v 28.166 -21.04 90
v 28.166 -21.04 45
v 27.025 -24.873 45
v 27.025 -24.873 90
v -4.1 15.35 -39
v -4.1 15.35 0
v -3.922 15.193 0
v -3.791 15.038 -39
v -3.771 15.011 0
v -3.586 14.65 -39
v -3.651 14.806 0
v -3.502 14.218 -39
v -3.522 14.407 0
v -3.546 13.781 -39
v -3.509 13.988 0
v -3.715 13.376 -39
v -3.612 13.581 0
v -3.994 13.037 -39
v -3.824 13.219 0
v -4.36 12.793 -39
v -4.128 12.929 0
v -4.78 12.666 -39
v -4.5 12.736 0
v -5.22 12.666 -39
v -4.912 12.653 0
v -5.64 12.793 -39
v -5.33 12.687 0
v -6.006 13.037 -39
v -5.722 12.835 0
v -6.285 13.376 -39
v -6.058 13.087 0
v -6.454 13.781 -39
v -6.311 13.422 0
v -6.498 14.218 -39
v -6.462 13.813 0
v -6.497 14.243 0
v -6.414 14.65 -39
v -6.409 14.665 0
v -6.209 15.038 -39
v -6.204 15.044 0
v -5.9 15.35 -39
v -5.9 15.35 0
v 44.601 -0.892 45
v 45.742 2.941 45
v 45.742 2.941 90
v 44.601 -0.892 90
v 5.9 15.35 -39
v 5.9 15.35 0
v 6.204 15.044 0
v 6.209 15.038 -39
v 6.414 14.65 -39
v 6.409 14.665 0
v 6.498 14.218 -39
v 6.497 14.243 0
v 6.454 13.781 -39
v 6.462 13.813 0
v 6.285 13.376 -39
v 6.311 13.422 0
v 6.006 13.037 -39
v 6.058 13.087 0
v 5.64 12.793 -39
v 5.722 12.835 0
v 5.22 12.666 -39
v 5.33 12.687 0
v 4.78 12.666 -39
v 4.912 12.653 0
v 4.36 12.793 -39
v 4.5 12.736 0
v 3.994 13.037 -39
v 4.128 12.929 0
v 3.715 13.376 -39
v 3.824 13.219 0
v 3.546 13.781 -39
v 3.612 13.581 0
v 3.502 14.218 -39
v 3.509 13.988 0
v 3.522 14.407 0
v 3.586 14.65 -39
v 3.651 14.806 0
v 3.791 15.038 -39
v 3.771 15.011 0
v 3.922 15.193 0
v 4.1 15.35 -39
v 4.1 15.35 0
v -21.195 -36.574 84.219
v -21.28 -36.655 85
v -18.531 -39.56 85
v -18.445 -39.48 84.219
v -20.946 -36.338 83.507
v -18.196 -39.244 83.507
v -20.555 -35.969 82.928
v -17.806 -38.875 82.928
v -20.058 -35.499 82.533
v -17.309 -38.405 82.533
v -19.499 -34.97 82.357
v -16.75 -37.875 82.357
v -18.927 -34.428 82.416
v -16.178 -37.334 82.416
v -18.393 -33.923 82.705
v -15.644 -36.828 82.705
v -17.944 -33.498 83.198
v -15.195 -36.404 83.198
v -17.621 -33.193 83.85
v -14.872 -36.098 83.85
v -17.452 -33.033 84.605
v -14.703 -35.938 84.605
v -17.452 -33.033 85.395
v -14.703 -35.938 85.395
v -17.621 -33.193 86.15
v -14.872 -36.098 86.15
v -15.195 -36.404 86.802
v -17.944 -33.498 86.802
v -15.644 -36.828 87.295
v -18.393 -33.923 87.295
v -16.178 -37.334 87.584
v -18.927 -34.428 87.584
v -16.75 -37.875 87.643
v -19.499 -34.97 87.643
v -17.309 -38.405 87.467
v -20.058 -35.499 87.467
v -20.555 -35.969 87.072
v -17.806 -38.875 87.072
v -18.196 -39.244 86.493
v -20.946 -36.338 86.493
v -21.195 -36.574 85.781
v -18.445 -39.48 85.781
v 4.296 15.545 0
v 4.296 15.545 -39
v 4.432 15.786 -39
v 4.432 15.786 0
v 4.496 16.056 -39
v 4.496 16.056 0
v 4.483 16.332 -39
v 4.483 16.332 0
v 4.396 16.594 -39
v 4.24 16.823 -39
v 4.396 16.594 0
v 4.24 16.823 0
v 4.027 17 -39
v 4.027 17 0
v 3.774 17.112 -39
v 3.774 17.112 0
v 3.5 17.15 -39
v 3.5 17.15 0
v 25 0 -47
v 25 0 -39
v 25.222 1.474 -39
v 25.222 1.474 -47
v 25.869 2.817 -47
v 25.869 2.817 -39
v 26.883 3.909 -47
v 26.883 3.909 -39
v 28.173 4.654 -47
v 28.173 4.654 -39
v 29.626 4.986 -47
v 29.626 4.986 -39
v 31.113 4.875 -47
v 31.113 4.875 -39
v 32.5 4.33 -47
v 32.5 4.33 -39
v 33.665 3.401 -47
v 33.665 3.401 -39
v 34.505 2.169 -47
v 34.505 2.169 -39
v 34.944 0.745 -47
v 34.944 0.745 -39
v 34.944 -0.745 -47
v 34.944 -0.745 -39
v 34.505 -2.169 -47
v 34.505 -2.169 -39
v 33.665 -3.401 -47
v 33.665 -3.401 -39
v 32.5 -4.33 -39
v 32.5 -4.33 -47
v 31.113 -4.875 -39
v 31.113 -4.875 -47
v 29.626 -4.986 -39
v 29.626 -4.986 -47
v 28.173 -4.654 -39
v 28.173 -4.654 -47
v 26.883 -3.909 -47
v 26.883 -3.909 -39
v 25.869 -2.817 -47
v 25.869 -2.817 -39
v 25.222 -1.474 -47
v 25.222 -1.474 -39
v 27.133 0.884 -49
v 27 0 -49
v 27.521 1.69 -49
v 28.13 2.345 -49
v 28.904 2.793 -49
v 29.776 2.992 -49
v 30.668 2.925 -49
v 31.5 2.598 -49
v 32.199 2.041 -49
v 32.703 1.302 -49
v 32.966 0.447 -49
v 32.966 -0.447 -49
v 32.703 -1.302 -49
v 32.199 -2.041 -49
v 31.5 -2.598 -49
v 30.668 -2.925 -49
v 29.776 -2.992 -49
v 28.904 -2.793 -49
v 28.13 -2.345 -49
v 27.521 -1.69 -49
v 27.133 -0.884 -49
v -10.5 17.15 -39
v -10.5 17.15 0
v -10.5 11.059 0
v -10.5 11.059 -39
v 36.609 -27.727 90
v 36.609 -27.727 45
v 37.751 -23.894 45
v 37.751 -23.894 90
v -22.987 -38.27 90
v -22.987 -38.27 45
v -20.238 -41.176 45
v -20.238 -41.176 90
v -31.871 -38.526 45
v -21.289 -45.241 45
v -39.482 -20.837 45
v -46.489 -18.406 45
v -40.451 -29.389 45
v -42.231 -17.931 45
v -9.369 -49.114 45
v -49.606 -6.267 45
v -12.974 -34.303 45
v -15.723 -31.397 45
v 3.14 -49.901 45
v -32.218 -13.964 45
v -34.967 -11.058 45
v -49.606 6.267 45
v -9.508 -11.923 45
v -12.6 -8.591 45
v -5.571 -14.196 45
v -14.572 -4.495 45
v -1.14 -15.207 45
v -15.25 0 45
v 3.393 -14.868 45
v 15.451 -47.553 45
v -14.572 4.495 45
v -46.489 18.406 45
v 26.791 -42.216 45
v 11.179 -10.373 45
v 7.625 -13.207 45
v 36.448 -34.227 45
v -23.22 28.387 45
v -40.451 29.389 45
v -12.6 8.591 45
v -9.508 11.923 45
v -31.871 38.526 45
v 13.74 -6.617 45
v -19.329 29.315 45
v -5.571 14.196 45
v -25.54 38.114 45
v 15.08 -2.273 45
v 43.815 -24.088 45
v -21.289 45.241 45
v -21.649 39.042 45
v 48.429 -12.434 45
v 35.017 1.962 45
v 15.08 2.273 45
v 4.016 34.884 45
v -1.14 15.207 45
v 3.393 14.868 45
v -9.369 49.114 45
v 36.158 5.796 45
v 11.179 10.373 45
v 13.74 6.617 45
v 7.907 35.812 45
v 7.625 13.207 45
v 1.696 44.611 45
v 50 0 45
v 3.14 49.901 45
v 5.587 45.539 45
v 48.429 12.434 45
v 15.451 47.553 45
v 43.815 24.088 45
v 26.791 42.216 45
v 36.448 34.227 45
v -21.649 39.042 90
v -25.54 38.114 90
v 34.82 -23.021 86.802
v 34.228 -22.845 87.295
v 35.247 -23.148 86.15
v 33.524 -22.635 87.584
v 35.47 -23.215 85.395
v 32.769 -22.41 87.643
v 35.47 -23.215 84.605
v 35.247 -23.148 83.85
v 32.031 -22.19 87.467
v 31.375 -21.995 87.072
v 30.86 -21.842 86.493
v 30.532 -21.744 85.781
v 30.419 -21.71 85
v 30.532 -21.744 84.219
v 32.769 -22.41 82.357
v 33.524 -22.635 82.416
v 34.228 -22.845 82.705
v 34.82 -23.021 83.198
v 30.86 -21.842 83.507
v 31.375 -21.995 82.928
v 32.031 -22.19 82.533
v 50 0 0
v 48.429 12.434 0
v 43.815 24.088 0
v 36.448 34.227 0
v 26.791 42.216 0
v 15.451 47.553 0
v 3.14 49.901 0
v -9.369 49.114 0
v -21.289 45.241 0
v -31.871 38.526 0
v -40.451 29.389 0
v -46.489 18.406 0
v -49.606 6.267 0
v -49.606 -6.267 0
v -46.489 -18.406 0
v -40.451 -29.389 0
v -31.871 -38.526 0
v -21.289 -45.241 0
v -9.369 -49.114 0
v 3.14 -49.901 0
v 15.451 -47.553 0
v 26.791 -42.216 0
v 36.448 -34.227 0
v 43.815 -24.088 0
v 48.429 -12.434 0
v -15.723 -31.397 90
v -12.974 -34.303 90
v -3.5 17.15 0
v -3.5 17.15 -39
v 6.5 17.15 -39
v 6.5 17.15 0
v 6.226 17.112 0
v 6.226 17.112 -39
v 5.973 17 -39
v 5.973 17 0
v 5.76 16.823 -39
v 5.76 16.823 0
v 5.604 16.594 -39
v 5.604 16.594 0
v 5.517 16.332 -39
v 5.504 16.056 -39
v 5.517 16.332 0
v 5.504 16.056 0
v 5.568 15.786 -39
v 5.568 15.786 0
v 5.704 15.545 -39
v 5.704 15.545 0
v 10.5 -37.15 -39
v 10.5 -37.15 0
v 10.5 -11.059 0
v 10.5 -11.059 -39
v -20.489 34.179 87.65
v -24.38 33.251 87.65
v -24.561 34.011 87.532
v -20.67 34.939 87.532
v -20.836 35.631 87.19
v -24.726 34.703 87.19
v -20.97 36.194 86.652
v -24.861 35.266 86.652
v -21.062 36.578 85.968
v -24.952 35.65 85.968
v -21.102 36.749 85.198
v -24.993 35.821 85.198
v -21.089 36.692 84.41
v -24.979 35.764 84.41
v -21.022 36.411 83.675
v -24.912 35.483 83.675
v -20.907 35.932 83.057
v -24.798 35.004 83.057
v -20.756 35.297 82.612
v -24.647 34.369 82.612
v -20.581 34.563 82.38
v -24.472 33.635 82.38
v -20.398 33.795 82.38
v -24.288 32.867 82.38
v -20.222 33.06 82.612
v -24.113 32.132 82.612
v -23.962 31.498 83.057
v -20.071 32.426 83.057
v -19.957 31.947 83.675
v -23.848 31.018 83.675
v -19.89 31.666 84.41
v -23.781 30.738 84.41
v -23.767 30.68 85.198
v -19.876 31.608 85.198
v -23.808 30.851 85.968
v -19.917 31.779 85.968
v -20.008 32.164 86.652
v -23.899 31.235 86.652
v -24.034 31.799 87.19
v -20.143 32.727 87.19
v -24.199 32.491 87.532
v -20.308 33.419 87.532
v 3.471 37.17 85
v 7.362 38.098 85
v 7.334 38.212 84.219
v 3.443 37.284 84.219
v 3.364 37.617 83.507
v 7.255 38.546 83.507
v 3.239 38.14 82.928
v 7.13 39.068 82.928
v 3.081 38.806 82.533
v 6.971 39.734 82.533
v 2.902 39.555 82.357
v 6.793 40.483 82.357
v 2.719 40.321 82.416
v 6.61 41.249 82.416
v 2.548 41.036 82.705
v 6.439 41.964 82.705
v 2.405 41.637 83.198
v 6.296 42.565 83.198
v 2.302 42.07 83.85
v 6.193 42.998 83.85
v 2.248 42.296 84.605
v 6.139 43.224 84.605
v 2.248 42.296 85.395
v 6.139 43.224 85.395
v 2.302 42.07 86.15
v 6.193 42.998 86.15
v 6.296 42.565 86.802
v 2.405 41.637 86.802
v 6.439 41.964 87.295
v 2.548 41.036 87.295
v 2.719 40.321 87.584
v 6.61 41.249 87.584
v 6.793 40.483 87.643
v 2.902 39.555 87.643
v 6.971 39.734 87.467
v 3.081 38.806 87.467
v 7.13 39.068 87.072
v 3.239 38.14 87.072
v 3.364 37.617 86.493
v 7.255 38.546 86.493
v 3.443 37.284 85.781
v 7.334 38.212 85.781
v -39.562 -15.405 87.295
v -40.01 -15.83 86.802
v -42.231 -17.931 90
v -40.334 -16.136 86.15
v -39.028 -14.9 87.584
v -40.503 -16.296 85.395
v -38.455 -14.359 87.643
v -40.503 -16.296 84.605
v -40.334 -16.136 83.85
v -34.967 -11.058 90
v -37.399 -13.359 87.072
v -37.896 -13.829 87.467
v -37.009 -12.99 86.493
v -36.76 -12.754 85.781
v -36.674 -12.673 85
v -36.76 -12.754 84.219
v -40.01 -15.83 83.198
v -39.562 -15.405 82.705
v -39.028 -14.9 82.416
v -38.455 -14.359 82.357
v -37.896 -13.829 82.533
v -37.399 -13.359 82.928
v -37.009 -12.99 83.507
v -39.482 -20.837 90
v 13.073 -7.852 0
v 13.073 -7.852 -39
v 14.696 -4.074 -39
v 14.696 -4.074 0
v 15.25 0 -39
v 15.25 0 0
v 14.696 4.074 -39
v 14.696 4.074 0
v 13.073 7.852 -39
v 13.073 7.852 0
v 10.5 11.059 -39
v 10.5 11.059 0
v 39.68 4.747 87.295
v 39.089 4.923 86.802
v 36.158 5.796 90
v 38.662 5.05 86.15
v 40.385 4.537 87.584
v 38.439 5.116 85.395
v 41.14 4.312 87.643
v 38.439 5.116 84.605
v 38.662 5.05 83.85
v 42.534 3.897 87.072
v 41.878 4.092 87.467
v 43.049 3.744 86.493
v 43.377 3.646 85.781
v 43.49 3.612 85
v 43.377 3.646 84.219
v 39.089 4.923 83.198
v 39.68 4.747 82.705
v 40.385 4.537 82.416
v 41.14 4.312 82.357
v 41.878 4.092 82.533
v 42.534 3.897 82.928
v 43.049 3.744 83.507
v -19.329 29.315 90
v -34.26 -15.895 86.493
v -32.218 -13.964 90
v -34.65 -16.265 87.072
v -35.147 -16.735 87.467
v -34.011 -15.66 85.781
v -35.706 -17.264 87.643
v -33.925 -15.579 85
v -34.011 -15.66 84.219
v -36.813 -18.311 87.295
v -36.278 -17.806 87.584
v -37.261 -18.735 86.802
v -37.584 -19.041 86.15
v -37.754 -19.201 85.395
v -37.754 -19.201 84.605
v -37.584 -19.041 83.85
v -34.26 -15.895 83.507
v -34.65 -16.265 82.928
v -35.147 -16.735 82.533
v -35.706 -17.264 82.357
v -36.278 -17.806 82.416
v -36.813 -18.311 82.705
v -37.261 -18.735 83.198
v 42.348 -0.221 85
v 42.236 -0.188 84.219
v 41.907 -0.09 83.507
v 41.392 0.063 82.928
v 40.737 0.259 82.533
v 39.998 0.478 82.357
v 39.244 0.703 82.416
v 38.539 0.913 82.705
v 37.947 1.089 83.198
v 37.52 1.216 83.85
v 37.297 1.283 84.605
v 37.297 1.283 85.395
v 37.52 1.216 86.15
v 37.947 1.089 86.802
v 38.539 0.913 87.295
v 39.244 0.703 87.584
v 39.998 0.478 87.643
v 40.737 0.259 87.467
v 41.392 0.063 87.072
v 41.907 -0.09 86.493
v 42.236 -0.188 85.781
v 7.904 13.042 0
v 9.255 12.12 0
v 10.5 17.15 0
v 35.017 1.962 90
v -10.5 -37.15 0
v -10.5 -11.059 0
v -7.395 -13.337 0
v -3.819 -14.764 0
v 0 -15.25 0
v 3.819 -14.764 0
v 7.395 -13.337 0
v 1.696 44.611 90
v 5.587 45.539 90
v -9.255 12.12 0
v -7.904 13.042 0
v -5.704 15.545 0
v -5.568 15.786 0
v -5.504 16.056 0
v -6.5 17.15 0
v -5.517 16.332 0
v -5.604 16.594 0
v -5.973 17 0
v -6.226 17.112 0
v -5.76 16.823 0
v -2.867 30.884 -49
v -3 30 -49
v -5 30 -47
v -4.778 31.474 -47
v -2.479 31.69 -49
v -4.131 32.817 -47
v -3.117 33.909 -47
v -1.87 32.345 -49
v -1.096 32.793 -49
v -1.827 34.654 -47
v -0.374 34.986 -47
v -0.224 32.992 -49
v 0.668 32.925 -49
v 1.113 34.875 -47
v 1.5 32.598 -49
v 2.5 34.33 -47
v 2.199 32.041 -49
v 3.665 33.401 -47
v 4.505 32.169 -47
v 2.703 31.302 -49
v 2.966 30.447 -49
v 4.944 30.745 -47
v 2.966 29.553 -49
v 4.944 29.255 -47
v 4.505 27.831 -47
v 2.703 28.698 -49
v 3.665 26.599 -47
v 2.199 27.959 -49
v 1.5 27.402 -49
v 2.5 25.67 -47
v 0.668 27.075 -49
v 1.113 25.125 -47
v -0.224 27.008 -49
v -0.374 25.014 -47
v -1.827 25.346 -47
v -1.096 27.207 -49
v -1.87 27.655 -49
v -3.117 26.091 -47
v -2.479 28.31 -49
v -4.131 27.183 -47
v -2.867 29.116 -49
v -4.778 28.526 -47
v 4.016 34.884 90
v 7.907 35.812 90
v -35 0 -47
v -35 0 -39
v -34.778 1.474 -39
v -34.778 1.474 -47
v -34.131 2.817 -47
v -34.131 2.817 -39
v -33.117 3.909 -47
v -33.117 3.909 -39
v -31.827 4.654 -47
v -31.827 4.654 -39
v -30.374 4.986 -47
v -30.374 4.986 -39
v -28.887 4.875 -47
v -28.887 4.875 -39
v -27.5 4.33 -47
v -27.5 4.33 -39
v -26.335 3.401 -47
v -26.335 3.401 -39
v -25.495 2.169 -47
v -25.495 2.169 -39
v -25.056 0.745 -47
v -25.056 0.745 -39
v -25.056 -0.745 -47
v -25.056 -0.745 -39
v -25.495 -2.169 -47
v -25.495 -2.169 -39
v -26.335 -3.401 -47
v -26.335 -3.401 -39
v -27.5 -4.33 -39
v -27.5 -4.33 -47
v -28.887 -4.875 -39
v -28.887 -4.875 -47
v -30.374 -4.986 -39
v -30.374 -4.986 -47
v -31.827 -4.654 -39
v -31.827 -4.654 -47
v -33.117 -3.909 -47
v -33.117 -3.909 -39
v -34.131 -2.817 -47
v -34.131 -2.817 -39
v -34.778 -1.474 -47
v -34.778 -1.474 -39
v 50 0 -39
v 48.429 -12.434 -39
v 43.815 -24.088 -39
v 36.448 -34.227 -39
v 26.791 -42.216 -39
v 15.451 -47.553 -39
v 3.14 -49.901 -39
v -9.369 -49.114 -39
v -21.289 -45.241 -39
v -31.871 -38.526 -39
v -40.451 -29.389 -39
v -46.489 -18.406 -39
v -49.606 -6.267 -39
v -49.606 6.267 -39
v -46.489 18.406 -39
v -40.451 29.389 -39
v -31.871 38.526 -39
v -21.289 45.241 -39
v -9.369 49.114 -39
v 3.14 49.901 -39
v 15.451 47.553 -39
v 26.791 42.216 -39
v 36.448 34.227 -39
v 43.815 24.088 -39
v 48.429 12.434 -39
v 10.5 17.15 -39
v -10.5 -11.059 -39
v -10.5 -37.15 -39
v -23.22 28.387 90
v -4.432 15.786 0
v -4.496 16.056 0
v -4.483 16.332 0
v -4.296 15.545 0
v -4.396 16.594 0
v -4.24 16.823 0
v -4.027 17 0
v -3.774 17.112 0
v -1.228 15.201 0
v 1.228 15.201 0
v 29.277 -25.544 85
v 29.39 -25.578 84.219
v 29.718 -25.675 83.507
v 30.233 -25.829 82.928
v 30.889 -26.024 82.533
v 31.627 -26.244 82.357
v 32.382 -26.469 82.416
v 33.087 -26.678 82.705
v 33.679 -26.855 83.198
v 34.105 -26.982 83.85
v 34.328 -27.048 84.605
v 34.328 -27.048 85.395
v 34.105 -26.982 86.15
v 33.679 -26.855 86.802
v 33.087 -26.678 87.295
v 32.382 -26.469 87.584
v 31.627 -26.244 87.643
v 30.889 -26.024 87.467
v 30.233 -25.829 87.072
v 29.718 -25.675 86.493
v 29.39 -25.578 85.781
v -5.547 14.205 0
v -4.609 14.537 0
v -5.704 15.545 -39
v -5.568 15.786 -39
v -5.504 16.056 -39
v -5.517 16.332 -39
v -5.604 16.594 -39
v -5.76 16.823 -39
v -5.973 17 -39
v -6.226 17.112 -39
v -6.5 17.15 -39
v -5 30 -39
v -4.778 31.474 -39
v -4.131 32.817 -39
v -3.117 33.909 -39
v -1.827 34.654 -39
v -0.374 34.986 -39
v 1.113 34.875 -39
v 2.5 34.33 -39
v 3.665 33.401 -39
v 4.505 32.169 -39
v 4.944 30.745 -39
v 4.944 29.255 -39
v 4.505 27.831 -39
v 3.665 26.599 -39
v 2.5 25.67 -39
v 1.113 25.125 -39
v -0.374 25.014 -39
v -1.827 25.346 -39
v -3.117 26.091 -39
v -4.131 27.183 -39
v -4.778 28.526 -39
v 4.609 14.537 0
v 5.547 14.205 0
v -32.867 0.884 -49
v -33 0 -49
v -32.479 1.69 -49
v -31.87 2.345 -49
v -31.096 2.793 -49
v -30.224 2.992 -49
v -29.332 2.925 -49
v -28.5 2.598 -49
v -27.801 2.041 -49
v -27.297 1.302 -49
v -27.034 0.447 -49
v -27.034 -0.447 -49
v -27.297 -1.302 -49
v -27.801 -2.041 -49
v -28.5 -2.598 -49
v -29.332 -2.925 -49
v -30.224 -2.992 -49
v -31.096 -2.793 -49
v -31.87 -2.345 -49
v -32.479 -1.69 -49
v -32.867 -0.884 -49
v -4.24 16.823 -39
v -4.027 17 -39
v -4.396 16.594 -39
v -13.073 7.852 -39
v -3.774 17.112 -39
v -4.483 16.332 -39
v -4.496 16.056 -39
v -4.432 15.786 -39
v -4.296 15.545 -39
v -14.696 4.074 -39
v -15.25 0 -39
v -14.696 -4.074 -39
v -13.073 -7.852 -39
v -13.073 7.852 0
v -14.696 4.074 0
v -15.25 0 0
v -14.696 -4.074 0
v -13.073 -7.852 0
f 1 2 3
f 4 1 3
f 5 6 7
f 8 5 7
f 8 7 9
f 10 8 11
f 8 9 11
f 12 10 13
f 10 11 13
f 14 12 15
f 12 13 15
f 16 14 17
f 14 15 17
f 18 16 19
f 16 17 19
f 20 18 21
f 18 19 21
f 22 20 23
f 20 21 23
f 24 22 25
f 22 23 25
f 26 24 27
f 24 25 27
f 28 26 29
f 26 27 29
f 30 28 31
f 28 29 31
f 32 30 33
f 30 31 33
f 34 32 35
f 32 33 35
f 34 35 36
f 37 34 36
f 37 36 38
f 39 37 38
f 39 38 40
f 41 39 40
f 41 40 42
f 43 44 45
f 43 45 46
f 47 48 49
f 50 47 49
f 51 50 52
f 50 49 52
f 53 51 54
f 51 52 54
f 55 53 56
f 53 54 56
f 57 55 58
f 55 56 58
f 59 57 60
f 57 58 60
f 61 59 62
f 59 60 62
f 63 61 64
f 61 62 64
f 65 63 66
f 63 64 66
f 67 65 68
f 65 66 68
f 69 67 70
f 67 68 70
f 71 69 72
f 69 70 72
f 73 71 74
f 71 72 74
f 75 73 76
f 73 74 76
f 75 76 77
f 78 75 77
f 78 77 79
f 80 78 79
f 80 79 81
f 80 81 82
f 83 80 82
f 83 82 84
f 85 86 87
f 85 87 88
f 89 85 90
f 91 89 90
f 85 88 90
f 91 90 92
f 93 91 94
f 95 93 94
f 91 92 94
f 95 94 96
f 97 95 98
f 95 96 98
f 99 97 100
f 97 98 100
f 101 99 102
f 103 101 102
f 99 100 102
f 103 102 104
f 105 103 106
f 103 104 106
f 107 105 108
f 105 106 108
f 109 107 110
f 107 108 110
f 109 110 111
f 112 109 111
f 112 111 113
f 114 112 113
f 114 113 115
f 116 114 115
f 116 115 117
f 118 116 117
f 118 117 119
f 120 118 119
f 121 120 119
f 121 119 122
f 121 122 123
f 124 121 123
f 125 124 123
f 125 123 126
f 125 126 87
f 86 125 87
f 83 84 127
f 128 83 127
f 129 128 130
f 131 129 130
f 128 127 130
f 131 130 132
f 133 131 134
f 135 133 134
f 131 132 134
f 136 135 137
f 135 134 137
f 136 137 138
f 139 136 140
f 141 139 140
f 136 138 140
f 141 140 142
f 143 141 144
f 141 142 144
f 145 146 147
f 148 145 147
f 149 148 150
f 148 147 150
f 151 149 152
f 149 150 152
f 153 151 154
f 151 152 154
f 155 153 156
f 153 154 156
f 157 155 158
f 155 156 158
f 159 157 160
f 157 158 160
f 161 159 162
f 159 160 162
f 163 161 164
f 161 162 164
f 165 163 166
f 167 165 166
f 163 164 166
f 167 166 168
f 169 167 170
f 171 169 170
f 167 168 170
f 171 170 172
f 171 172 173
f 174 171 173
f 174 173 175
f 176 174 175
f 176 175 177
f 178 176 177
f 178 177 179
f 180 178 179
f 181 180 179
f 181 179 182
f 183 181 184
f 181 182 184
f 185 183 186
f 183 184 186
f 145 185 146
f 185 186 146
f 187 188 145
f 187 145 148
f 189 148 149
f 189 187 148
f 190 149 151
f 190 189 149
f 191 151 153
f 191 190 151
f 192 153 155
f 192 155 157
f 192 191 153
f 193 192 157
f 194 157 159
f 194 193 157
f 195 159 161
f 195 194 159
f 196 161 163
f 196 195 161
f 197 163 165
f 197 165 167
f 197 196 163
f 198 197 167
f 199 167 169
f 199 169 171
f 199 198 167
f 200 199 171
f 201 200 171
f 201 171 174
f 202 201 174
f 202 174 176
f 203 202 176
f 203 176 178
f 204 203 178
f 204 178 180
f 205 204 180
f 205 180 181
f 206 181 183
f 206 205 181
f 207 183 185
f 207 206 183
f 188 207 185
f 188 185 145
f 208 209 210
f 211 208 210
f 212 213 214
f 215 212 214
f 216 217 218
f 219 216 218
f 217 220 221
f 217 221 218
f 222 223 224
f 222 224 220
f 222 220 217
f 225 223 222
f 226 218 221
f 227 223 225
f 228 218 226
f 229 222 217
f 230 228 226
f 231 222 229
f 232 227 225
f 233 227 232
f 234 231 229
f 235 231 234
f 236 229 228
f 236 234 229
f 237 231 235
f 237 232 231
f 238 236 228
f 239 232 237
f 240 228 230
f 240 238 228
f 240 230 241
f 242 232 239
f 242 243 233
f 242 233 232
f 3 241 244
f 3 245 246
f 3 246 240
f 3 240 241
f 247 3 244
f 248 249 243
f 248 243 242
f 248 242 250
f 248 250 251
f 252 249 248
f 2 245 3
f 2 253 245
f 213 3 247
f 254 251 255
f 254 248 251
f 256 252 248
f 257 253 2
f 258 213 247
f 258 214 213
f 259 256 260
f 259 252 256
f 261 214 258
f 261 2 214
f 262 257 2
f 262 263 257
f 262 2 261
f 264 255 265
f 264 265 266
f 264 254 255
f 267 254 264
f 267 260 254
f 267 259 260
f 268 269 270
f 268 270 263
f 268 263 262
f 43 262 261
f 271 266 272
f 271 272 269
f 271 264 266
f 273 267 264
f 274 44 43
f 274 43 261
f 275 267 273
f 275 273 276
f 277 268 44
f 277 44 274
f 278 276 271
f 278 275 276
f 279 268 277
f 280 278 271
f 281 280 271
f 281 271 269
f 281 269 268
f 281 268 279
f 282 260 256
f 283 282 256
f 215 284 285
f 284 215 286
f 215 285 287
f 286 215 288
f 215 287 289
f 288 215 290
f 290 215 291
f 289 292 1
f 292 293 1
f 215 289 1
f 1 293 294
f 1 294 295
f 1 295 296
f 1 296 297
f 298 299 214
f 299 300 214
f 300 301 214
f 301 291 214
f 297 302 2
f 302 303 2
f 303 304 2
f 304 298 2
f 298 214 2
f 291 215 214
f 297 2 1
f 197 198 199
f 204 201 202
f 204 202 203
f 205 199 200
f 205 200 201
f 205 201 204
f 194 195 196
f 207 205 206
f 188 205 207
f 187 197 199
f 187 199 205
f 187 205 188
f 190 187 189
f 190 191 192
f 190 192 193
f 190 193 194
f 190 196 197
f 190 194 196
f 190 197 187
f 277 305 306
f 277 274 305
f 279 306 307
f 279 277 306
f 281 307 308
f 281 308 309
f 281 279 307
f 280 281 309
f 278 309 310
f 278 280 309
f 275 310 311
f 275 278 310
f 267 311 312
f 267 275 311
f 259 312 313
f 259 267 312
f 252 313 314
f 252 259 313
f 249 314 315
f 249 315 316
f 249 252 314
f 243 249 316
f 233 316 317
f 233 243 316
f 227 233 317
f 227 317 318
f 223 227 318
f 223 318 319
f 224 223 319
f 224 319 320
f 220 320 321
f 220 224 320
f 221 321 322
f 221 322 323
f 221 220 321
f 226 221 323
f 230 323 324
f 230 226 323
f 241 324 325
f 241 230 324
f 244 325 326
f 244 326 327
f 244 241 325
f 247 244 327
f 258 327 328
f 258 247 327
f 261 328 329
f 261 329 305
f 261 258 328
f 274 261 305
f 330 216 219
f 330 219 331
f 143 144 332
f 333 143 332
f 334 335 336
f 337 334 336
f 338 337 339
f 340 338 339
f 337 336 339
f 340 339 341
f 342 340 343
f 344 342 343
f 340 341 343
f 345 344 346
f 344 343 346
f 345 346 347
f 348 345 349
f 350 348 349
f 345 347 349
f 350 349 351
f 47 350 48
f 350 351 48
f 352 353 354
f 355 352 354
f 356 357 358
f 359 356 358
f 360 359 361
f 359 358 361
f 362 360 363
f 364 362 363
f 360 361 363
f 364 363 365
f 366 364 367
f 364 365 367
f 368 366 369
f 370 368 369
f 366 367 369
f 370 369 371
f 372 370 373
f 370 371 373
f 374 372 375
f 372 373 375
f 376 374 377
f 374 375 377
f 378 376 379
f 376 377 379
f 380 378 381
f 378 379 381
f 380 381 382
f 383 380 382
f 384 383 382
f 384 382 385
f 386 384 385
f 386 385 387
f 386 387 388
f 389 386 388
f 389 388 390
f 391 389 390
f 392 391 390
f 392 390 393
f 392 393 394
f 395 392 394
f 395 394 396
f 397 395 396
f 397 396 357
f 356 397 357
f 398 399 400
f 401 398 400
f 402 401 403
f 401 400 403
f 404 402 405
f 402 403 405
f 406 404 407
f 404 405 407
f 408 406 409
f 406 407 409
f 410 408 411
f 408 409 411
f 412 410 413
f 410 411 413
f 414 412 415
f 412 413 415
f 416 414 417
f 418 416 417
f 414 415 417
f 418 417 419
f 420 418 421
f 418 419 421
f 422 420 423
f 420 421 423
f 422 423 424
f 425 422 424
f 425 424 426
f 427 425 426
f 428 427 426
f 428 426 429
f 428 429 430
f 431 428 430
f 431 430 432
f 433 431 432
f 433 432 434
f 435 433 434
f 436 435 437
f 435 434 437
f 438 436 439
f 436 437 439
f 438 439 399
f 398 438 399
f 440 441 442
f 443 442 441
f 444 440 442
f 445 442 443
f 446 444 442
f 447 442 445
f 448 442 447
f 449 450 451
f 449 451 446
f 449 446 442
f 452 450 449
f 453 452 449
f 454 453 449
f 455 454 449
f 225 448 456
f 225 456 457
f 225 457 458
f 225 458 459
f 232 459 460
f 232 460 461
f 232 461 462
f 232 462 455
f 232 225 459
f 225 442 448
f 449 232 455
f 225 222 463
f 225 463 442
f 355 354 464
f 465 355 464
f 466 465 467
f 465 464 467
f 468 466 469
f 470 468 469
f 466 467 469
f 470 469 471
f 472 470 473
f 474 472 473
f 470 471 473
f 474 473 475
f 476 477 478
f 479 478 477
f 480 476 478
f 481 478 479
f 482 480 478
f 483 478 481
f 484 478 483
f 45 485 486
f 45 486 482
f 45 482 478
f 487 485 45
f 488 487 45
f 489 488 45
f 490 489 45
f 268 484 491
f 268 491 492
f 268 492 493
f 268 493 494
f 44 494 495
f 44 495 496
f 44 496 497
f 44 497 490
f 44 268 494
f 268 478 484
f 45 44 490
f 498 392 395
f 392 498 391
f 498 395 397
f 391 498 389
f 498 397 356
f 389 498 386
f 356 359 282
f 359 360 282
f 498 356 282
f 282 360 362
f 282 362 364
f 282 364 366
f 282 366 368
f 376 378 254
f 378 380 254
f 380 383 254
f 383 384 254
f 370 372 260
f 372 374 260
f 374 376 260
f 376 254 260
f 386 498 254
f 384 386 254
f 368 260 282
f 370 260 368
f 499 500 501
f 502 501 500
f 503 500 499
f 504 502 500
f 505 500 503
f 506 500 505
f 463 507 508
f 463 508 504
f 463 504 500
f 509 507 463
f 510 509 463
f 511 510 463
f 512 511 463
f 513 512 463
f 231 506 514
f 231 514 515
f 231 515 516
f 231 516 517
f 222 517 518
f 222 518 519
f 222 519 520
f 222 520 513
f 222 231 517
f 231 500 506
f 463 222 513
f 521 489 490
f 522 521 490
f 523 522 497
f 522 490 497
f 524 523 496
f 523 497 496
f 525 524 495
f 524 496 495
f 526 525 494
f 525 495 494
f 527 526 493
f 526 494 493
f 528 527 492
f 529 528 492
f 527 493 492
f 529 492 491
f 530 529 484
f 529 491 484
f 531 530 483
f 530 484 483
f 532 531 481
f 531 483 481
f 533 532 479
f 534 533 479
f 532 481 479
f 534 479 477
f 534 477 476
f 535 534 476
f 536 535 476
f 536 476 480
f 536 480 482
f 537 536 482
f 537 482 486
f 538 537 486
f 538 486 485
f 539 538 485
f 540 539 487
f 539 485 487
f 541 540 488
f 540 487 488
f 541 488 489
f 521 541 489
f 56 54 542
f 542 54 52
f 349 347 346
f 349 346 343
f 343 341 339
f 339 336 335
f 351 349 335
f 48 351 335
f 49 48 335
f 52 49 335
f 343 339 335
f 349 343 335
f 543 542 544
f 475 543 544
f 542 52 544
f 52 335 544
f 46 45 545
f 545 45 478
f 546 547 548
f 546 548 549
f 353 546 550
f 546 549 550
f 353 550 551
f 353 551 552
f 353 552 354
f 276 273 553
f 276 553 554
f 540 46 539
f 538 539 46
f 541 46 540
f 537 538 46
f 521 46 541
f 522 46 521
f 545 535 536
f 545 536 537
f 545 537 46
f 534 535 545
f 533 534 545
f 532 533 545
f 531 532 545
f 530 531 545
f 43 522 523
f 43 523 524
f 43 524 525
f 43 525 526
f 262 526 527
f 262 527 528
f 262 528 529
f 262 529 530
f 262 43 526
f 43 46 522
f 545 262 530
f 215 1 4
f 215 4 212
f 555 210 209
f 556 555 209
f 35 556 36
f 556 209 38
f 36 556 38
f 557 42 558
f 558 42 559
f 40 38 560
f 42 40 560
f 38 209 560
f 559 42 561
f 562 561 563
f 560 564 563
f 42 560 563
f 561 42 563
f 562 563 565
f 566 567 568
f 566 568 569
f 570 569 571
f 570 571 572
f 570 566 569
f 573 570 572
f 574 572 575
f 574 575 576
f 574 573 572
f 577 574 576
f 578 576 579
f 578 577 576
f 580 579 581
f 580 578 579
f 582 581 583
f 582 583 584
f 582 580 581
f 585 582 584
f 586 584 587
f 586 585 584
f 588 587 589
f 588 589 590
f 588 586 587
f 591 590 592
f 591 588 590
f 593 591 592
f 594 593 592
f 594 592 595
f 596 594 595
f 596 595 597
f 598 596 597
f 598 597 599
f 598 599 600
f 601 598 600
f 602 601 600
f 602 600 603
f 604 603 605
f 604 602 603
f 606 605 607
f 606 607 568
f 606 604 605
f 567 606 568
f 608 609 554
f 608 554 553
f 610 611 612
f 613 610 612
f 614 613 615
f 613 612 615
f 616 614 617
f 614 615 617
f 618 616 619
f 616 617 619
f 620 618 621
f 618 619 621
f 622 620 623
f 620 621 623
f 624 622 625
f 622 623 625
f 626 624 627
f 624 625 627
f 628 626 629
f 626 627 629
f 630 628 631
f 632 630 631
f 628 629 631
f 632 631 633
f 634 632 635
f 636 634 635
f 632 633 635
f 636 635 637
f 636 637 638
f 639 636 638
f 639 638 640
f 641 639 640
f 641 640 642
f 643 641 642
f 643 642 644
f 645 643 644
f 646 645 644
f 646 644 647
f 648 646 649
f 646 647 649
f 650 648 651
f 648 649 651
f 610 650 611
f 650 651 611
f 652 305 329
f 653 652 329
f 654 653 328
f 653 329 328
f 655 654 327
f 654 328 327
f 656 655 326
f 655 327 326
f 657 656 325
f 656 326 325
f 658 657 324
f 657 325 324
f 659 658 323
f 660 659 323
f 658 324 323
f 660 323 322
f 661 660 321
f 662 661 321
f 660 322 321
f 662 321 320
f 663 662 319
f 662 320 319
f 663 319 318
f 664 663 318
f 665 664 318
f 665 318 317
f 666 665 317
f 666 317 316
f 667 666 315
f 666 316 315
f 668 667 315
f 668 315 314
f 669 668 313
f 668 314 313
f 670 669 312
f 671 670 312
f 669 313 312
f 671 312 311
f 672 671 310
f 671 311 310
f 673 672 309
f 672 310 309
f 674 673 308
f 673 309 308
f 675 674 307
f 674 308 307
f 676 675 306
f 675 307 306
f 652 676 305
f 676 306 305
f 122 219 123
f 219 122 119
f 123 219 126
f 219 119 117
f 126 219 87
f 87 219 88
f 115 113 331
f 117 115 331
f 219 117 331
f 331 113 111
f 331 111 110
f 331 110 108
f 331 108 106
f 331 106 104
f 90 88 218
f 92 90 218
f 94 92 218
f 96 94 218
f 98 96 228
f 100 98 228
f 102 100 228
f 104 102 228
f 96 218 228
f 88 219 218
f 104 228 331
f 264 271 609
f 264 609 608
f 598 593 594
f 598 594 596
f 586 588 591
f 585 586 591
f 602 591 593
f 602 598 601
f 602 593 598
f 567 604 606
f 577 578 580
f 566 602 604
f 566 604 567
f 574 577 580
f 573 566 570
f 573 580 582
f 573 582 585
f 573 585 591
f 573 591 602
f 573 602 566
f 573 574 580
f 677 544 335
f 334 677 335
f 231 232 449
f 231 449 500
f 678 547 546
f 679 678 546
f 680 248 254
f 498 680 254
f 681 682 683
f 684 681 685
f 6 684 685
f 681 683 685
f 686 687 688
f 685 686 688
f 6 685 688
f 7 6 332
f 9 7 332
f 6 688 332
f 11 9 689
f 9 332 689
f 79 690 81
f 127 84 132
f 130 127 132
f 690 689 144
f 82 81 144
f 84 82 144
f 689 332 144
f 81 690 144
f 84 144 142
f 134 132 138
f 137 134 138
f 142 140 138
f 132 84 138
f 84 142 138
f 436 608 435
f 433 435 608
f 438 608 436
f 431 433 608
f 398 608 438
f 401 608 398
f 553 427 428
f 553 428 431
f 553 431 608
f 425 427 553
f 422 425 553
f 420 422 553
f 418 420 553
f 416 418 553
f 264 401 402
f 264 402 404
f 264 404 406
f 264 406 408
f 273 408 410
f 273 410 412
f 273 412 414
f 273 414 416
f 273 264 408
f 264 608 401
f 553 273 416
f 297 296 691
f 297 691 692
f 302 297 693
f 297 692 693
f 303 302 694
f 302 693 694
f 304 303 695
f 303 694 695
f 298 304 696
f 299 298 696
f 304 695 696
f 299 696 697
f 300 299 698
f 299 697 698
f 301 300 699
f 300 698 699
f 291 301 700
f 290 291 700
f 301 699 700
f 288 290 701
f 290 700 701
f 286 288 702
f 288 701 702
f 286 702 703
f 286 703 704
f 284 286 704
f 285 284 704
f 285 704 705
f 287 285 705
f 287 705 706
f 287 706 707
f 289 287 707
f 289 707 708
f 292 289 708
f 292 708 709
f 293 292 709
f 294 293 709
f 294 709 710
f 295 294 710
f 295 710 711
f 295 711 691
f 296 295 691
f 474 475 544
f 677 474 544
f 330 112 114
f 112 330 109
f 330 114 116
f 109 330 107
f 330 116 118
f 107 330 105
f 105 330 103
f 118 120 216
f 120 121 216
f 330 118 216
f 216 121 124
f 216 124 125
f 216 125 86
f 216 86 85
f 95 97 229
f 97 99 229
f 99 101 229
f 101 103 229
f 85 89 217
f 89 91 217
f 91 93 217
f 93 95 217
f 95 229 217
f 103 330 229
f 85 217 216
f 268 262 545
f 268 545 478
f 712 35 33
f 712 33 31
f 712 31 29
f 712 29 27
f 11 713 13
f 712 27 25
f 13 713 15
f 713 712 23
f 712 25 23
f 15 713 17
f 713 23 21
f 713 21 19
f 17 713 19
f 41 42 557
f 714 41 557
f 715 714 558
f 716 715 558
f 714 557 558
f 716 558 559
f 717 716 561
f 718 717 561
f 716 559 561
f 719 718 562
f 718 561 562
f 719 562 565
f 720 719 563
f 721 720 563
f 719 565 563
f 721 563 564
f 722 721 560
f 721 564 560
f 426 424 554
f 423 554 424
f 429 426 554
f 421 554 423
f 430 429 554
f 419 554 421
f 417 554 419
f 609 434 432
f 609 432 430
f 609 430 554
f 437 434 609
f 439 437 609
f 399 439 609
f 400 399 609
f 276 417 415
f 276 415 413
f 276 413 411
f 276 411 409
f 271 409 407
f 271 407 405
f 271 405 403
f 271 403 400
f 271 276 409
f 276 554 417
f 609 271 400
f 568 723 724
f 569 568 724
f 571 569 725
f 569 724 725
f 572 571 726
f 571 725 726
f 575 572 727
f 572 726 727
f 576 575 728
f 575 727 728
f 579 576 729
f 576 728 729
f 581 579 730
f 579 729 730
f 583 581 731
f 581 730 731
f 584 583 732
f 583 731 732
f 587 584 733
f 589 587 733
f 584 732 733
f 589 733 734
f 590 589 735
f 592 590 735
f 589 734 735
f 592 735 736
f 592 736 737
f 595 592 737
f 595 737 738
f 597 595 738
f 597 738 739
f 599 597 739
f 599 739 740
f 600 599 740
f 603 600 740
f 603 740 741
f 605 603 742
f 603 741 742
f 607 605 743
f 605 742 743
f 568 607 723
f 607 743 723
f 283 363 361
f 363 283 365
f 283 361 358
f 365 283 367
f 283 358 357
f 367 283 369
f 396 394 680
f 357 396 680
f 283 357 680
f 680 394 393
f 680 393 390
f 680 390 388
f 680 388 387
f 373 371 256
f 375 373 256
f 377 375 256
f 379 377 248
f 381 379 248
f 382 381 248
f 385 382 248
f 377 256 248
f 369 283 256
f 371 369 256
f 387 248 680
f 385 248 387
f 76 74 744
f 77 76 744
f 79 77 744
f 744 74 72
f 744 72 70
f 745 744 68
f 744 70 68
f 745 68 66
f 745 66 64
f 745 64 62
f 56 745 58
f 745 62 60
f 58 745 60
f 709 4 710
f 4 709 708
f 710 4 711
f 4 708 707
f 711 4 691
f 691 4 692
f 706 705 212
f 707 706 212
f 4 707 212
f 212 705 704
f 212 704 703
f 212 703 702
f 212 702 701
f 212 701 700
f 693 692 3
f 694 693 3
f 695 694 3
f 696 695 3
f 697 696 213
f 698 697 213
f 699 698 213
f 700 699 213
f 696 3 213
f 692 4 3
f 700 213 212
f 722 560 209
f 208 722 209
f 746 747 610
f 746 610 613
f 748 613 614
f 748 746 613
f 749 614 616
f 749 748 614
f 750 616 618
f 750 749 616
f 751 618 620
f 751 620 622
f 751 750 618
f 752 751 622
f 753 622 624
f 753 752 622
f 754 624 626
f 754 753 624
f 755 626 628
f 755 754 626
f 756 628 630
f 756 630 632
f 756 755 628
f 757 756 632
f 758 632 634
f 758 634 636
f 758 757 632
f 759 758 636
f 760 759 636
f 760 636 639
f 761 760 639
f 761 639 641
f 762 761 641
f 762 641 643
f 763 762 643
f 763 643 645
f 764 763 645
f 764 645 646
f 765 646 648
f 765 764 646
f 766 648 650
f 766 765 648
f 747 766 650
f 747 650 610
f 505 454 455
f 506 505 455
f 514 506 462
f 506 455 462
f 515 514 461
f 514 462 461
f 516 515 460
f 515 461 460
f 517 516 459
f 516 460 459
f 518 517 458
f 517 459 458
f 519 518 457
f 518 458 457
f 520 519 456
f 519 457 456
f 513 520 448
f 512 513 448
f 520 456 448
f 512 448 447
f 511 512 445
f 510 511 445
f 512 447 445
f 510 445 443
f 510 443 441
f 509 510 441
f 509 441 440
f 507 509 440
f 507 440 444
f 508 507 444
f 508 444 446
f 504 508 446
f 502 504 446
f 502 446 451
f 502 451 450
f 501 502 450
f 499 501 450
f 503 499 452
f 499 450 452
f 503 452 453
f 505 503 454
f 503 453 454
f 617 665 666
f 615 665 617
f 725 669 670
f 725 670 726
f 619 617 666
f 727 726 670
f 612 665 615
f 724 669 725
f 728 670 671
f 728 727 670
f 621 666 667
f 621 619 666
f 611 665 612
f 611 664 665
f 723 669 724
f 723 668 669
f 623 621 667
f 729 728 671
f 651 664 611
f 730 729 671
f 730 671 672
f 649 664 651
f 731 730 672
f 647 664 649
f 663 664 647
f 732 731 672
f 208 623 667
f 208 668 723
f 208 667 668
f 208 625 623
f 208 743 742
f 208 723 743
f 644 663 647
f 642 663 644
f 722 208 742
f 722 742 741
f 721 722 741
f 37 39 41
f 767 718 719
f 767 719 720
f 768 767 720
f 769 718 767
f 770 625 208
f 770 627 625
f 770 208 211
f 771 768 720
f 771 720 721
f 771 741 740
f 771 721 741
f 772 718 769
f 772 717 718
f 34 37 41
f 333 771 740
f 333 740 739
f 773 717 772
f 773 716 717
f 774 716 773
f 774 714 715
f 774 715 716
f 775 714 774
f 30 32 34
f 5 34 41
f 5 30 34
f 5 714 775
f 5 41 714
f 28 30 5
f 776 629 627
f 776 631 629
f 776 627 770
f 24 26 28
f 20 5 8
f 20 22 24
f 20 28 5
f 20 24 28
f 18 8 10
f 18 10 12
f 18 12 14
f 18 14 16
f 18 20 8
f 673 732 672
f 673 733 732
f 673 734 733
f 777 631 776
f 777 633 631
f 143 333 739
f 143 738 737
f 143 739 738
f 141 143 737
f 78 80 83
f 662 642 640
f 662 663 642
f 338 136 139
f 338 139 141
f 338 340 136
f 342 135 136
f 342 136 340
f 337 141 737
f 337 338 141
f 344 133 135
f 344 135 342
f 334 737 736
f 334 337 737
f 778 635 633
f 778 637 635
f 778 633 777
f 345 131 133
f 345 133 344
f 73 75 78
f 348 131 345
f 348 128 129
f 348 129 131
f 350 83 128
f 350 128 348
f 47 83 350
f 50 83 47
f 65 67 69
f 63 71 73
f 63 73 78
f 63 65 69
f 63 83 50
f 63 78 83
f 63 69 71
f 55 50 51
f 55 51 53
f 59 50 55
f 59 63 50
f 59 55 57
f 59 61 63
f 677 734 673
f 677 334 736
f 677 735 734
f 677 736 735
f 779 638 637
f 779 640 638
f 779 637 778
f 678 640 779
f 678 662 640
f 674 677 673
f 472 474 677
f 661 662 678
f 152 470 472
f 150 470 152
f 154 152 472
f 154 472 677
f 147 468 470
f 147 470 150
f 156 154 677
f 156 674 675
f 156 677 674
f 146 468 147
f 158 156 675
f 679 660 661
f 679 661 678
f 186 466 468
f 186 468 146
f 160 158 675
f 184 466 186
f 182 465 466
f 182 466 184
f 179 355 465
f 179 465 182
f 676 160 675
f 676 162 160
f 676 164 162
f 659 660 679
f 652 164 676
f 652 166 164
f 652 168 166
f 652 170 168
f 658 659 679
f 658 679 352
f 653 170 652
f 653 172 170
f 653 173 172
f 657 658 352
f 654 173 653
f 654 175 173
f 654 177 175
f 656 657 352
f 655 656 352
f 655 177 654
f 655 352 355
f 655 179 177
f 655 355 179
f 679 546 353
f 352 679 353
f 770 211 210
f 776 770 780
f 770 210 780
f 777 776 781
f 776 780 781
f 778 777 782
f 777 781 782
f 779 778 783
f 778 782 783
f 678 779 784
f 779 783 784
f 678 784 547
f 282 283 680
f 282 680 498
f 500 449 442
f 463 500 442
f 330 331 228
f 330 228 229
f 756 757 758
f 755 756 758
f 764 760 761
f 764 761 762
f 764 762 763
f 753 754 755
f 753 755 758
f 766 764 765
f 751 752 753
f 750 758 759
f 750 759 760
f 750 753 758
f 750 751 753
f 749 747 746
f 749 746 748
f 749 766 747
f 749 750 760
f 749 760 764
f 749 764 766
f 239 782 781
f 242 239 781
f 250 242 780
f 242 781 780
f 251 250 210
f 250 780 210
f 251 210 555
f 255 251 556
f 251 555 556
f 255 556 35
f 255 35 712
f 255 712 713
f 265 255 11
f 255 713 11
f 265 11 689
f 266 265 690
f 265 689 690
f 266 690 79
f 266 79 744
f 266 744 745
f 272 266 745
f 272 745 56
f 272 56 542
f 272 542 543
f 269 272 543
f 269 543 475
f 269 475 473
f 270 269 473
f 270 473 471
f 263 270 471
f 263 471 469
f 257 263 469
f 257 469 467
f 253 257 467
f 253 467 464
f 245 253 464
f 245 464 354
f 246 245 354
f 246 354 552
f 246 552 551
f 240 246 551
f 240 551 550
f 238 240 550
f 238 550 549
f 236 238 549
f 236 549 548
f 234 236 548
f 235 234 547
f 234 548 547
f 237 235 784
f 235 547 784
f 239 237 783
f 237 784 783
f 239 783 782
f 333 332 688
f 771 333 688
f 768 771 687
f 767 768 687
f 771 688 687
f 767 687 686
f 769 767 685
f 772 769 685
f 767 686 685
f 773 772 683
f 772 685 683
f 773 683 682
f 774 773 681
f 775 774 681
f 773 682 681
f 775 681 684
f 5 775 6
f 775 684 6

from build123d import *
from build123d.topology import SkipClean

# Parameters (mm, degrees)
SKETCH1_R               = 50
SKETCH3_R               = 50
BOSS_EXTRUDE1_DEPTH     = 45
SKETCH21_R              = 15.25
CUT_EXTRUDE1_DEPTH      = 115.45523151
CUT_EXTRUDE1_DEPTH_BACK = 115.45523151
SKETCH23_W              = 2.65
SKETCH23_H              = 49.393967623
M5_CLEARANCE_HOLE8_D    = 5.3
SKETCH27_W              = 2.65
SKETCH27_H              = 60.041961507
M5_CLEARANCE_HOLE10_D   = 5.3
SKETCH32_W              = 2.65
SKETCH32_H              = 51.511335507
M5_CLEARANCE_HOLE12_D   = 5.3
SKETCH35_R              = 50
BOSS_EXTRUDE2_DEPTH     = 39
SKETCH36_R              = 5
BOSS_EXTRUDE3_DEPTH     = 10
CHAMFER1_SIZE           = 2


with BuildPart() as part:
    # Sketch1 → Loft1 section 0
    with BuildSketch(Plane.XY):
        Circle(SKETCH1_R)
    # Sketch3 → Loft1 section 1
    with BuildSketch(Plane.XY.offset(45)):
        Circle(SKETCH3_R)
    loft()

    # Sketch4 → Boss-Extrude1 (add)
    with BuildSketch(Plane.XY.offset(45)):
        Polygon((-21.649255971, 39.042410979), (-25.54010328, 38.114344591), (-23.21993731, 28.387226319), (-19.329090001, 29.315292707), align=None)
        Polygon((1.695827881, 44.610809306), (5.58667519, 45.538875693), (7.90684116, 35.811757422), (4.015993851, 34.883691034), align=None)
        Polygon((35.016664181, 1.962066431), (36.158358767, 5.795672237), (45.74237328, 2.941435772), (44.600678694, -0.892170034), align=None)
        Polygon((28.166496664, -21.039568402), (27.024802078, -24.873174207), (36.608816592, -27.727410673), (37.750511178, -23.893804867), align=None)
        Polygon((-22.987090484, -38.270012468), (-20.237937762, -41.175551885), (-12.974089217, -34.302670079), (-15.72324194, -31.397130661), align=None)
        Polygon((-39.48200682, -20.836775962), (-42.231159542, -17.931236544), (-34.967310998, -11.058354737), (-32.218158276, -13.963894155), align=None)
    extrude(amount=BOSS_EXTRUDE1_DEPTH)

    # Sketch21 → Cut-Extrude1 (cut, two sides)
    with BuildSketch(Plane(origin=(0, 0, 0), x_dir=(-1, 0, 0), z_dir=(0, 0, -1))) as cut_extrude1_sk:
        Circle(SKETCH21_R)
    extrude(amount=CUT_EXTRUDE1_DEPTH, mode=Mode.SUBTRACT)
    extrude(cut_extrude1_sk.sketch, amount=-CUT_EXTRUDE1_DEPTH_BACK, mode=Mode.SUBTRACT)

    # Sketch23 → M5 Clearance Hole7 (revolve, cut)
    with BuildSketch(Plane(origin=(2.855910866, 39.74725017, 85), x_dir=(0.23201659695614316, -0.9727118271805328, 0), z_dir=(0, 0, 1))):
        with Locations((1.325, 24.696983812)):
            Rectangle(SKETCH23_W, SKETCH23_H)
    revolve(axis=Axis((-3.320809236, 38.273944779, 85), (0.9727118271805328, 0.23201659695614313, 0)), mode=Mode.SUBTRACT)

    # M5 Clearance Hole8 (through all)
    with Locations(Plane(origin=(-11.672541926, -2.784199164, 0), x_dir=(0, 0, -1), z_dir=(0.9727118271805437, 0.23201659695609775, 0))):
        with Locations((-85, 38.000001617)):
            Hole(M5_CLEARANCE_HOLE8_D / 2)

    # Sketch27 → M5 Clearance Hole9 (revolve, cut)
    with BuildSketch(Plane(origin=(-35.850082548, -17.400335058, 85), x_dir=(0.7263848544218454, 0.687288180653905, 0), z_dir=(0, 0, 1))):
        with Locations((1.325, 30.020980754)):
            Rectangle(SKETCH27_W, SKETCH27_H)
    revolve(axis=Axis((-31.485802601, -22.012878884, 85), (-0.6872881806539048, 0.7263848544218454, 0)), mode=Mode.SUBTRACT)

    # M5 Clearance Hole10 (through all)
    with Locations(Plane(origin=(8.247459431, -8.716619588, 0), x_dir=(0.726384854421872, 0.6872881806538769, 0), z_dir=(-0.6872881806538769, 0.726384854421872, 0))):
        with Locations((-38.000001617, -85)):
            Hole(M5_CLEARANCE_HOLE10_D / 2)

    # Sketch32 → M5 Clearance Hole11 (revolve, cut)
    with BuildSketch(Plane(origin=(39.808671437, 0.534948199, 85), x_dir=(0.9584014513779905, -0.28542364652663516, 0), z_dir=(0, 0, 1))):
        with Locations((1.325, 25.755667754)):
            Rectangle(SKETCH32_W, SKETCH32_H)
    revolve(axis=Axis((37.996231282, -5.550901018, 85), (0.2854236465266351, 0.9584014513779905, 0)), mode=Mode.SUBTRACT)

    # M5 Clearance Hole12 (through all)
    with Locations(Plane(origin=(-3.460752782, -11.620587605, 0), x_dir=(0.9584014513779878, -0.28542364652664387, 0), z_dir=(0.28542364652664387, 0.9584014513779878, 0))):
        with Locations((38.000001617, -85)):
            Hole(M5_CLEARANCE_HOLE12_D / 2)

    # Sketch35 → Boss-Extrude2 (add)
    with SkipClean():  # the faces are left unmerged after this step: merging them gives an invalid solid
        with BuildSketch(Plane(origin=(0, 0, 0), x_dir=(-1, 0, 0), z_dir=(0, 0, -1))):
            with Locations(Location((0, 0, 0), (0, 0, 180))):
                Circle(SKETCH35_R)
            with BuildLine():
                ThreePointArc((-4.1, 15.35), (-4.448683298, 16.466227766), (-3.5, 17.15))
                Line((-3.5, 17.15), (3.5, 17.15))
                ThreePointArc((3.5, 17.15), (4.448683298, 16.466227766), (4.1, 15.35))
                ThreePointArc((4.1, 15.35), (5, 12.65), (5.9, 15.35))
                ThreePointArc((5.9, 15.35), (5.551316702, 16.466227766), (6.5, 17.15))
                Line((6.5, 17.15), (10.5, 17.15))
                Line((10.5, 17.15), (10.5, 11.05949818))
                ThreePointArc((10.5, 11.05949818), (15.25, 0), (10.5, -11.05949818))
                Line((10.5, -11.05949818), (10.5, -37.15))
                Line((10.5, -37.15), (-10.5, -37.15))
                Line((-10.5, -37.15), (-10.5, -11.05949818))
                ThreePointArc((-10.5, -11.05949818), (-15.25, 0), (-10.5, 11.05949818))
                Line((-10.5, 11.05949818), (-10.5, 17.15))
                Line((-10.5, 17.15), (-6.5, 17.15))
                ThreePointArc((-6.5, 17.15), (-5.551316702, 16.466227766), (-5.9, 15.35))
                ThreePointArc((-5.9, 15.35), (-5, 12.65), (-4.1, 15.35))
            make_face(mode=Mode.SUBTRACT)
        extrude(amount=BOSS_EXTRUDE2_DEPTH)

    # Sketch36 → Boss-Extrude3 (add)
    with SkipClean():  # the faces are left unmerged after this step: merging them gives an invalid solid
        with BuildSketch(Plane(origin=(0, 0, -39), x_dir=(-1, 0, 0), z_dir=(0, 0, -1))):
            with Locations((0, 30)):
                Circle(SKETCH36_R)
            with Locations((-30, 0)):
                Circle(SKETCH36_R)
            with Locations((30, 0)):
                Circle(SKETCH36_R)
        extrude(amount=BOSS_EXTRUDE3_DEPTH)

    # Chamfer1
    chamfer1_edges = [part.edges().sort_by_distance(p)[0] for p in [
        (5, 30, -49),
        (35, 0, -49),
        (-25, 0, -49),
    ]]
    chamfer(chamfer1_edges, length=CHAMFER1_SIZE)


solid = part.part
